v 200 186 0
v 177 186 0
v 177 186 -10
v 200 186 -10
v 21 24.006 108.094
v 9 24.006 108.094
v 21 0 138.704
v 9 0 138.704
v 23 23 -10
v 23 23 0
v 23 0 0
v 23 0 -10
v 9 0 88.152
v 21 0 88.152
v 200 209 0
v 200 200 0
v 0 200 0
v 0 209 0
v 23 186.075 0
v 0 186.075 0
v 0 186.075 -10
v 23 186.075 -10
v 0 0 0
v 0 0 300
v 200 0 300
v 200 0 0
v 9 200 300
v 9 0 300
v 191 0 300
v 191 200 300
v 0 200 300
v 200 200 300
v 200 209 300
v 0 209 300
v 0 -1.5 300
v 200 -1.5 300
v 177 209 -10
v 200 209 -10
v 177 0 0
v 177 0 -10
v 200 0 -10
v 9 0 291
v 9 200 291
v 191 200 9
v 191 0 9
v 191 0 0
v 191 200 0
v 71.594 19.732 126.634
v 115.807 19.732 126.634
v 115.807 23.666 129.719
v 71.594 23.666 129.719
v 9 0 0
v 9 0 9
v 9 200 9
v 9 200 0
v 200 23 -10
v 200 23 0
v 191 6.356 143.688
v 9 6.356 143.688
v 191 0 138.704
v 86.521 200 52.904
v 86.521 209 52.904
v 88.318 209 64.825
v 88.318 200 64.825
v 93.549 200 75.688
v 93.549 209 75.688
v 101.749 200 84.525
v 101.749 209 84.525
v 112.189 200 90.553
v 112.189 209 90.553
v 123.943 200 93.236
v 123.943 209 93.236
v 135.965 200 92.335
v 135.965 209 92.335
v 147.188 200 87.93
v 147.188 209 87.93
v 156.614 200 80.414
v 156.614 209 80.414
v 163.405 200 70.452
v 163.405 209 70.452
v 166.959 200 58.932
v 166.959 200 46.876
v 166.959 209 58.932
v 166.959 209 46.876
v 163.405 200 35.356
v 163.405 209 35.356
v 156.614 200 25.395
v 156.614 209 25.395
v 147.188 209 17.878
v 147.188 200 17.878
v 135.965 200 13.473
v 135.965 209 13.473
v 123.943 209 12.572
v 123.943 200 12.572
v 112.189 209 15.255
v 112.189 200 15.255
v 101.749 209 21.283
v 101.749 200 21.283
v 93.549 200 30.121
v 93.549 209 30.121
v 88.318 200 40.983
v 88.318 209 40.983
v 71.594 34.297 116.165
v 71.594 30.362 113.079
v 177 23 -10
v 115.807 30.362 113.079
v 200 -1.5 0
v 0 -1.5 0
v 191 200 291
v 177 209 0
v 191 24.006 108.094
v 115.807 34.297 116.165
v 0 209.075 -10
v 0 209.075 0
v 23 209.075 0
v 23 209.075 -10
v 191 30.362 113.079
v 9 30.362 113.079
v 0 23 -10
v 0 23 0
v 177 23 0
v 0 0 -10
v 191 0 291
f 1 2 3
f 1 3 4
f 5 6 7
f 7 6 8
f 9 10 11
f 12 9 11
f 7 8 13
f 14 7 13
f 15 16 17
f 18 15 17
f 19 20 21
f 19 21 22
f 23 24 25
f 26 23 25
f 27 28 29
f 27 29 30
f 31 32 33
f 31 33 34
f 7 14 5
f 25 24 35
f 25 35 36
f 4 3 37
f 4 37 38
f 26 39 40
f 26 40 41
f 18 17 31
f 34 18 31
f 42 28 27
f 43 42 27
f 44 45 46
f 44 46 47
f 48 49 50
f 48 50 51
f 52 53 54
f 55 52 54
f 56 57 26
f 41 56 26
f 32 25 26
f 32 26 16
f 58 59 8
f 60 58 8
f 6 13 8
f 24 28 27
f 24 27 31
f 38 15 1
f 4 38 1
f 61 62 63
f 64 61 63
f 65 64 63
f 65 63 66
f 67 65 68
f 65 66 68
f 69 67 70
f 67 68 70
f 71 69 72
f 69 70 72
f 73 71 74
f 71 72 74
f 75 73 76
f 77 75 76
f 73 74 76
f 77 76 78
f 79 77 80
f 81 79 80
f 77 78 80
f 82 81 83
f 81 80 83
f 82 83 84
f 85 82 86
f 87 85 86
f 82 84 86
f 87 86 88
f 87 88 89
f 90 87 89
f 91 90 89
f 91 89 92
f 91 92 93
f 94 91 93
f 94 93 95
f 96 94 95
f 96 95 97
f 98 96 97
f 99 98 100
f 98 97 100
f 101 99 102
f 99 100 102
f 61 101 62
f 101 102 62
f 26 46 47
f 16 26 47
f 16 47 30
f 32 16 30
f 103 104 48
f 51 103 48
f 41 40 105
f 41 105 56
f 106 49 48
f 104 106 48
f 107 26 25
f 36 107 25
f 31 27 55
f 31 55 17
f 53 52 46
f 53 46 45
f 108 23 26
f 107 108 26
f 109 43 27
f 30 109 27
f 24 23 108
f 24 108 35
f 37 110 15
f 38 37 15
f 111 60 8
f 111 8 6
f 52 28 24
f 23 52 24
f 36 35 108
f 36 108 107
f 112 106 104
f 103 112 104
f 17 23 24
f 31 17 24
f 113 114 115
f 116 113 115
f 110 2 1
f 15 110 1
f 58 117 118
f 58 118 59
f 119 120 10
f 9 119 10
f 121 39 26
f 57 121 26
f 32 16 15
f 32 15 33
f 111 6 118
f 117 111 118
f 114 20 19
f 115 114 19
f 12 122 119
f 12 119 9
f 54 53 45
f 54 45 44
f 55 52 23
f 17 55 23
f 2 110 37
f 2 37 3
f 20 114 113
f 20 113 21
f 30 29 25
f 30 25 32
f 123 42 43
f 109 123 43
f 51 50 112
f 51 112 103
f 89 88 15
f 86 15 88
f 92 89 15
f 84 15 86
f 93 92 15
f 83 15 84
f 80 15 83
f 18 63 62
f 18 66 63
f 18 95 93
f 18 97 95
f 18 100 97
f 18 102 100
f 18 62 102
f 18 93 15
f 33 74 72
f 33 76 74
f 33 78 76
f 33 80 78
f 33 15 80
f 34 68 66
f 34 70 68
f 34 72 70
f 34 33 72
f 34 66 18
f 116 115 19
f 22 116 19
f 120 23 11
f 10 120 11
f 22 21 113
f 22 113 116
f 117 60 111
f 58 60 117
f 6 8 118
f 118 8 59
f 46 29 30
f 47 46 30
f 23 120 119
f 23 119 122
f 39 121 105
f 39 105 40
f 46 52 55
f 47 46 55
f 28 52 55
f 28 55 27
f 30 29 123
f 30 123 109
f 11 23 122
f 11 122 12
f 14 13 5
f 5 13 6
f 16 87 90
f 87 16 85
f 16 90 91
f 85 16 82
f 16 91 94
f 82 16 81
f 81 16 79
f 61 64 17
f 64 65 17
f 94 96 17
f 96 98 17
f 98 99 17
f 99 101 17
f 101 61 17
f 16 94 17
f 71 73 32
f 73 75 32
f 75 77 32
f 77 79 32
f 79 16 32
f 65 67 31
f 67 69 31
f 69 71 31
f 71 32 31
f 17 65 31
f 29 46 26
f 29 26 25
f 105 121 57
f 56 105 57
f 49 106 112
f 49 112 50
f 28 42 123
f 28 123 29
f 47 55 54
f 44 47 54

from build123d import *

# Parameters (mm, degrees)
F0_W      = 200
F0_H      = 300
F1_DEPTH  = 1.5
F2_W      = 9
F2_H      = 300
F3_DEPTH  = 200
F5_DEPTH  = 12
F7_DEPTH  = 182
F8_W      = 44.21284
F8_H      = 17.226002
F9_DEPTH  = 5
F10_W     = 200
F10_H     = 9
F11_DEPTH = 182
F12_W     = 200
F12_H     = 9
F13_DEPTH = 182
F14_W     = 200
F14_H     = 300
F15_DEPTH = 9
F16_W     = 200
F16_H     = 300
F17_DEPTH = 9
F18_R     = 40.444781
F19_DEPTH = 9
F20_W     = 23
F20_H     = 23
F21_DEPTH = 10
F22_W     = 23
F22_H     = 23
F23_DEPTH = 10
F24_W     = 23
F24_H     = 23
F25_DEPTH = 10
F26_W     = 23
F26_H     = 23
F27_DEPTH = 10


with BuildPart() as f1:
    # F0 (on Front) → F1 (new body)
    with BuildSketch(Plane.XZ):
        with Locations((100, 150)):
            Rectangle(F0_W, F0_H)
    extrude(amount=F1_DEPTH)


with BuildPart() as f3:
    # F2 (on face) → F3 (new body)
    with BuildSketch(Plane(origin=(0, 0, 0), x_dir=(-1, 0, 0), z_dir=(0, 1, 0))):
        with Locations((-4.5, 150)):
            Rectangle(F2_W, F2_H)
    extrude(amount=F3_DEPTH)


with BuildPart() as f5:
    # F4 (on face) → F5 (new body)
    with BuildSketch(Plane.YZ.offset(9)):
        Polygon((24.006182, 108.094089), (0, 138.703629), (0, 88.151507), align=None)
    extrude(amount=F5_DEPTH)


with BuildPart() as f7:
    # F6 (on face) → F7 (new body)
    with BuildSketch(Plane.YZ.offset(9)):
        Polygon((0, 138.703629), (24.006182, 108.094089), (30.362231, 113.078955), (6.356049, 143.688496), align=None)
    extrude(amount=F7_DEPTH)


with BuildPart() as f9:
    # F8 (on face) → F9 (new body)
    with BuildSketch(Plane(origin=(0, 73.709477, 57.808223), x_dir=(-1, 0, 0), z_dir=(0, 0.78687, 0.617119))):
        with Locations((-93.700122, 78.854282)):
            Rectangle(F8_W, F8_H)
    extrude(amount=F9_DEPTH)


with BuildPart() as f11:
    # F10 (on face) → F11 (new body)
    with BuildSketch(Plane.YZ.offset(9)):
        with Locations((100, 295.5)):
            Rectangle(F10_W, F10_H)
    extrude(amount=F11_DEPTH)


with BuildPart() as f13:
    # F12 (on face) → F13 (new body)
    with BuildSketch(Plane.YZ.offset(9)):
        with Locations((100, 4.5)):
            Rectangle(F12_W, F12_H)
    extrude(amount=F13_DEPTH)


with BuildPart() as f15:
    # F14 (on face) → F15 (new body)
    with BuildSketch(Plane.YZ.offset(191)):
        with Locations((100, 150)):
            Rectangle(F14_W, F14_H)
    extrude(amount=F15_DEPTH)


with BuildPart() as f17:
    # F16 (on face) → F17 (new body)
    with BuildSketch(Plane(origin=(0, 200, 0), x_dir=(-1, 0, 0), z_dir=(0, 1, 0))):
        with Locations((-100, 150)):
            Rectangle(F16_W, F16_H)
    extrude(amount=F17_DEPTH)

    # F18 (on face) → F19 (cut)
    with BuildSketch(Plane(origin=(0, 209, 0), x_dir=(-1, 0, 0), z_dir=(0, 1, 0))):
        with Locations((-126.965553, 52.904155)):
            Circle(F18_R)
    extrude(amount=-F19_DEPTH, mode=Mode.SUBTRACT)


with BuildPart() as f21:
    # F20 (on face) → F21 (new body)
    with BuildSketch(Plane(origin=(0, 0, 0), x_dir=(1, 0, 0), z_dir=(0, 0, -1))):
        with Locations((11.5, -11.5)):
            Rectangle(F20_W, F20_H)
    extrude(amount=F21_DEPTH)


with BuildPart() as f23:
    # F22 (on face) → F23 (new body)
    with BuildSketch(Plane(origin=(0, 0, 0), x_dir=(1, 0, 0), z_dir=(0, 0, -1))):
        with Locations((188.5, -11.5)):
            Rectangle(F22_W, F22_H)
    extrude(amount=F23_DEPTH)


with BuildPart() as f25:
    # F24 (on face) → F25 (new body)
    with BuildSketch(Plane(origin=(0, 0, 0), x_dir=(1, 0, 0), z_dir=(0, 0, -1))):
        with Locations((11.5, -197.575272)):
            Rectangle(F24_W, F24_H)
    extrude(amount=F25_DEPTH)


with BuildPart() as f27:
    # F26 (on face) → F27 (new body)
    with BuildSketch(Plane(origin=(0, 0, 0), x_dir=(1, 0, 0), z_dir=(0, 0, -1))):
        with Locations((188.5, -197.5)):
            Rectangle(F26_W, F26_H)
    extrude(amount=F27_DEPTH)


solid = Compound([f1.part, f3.part, f5.part, f7.part, f9.part, f11.part, f13.part, f15.part, f17.part, f21.part, f23.part, f25.part, f27.part])
